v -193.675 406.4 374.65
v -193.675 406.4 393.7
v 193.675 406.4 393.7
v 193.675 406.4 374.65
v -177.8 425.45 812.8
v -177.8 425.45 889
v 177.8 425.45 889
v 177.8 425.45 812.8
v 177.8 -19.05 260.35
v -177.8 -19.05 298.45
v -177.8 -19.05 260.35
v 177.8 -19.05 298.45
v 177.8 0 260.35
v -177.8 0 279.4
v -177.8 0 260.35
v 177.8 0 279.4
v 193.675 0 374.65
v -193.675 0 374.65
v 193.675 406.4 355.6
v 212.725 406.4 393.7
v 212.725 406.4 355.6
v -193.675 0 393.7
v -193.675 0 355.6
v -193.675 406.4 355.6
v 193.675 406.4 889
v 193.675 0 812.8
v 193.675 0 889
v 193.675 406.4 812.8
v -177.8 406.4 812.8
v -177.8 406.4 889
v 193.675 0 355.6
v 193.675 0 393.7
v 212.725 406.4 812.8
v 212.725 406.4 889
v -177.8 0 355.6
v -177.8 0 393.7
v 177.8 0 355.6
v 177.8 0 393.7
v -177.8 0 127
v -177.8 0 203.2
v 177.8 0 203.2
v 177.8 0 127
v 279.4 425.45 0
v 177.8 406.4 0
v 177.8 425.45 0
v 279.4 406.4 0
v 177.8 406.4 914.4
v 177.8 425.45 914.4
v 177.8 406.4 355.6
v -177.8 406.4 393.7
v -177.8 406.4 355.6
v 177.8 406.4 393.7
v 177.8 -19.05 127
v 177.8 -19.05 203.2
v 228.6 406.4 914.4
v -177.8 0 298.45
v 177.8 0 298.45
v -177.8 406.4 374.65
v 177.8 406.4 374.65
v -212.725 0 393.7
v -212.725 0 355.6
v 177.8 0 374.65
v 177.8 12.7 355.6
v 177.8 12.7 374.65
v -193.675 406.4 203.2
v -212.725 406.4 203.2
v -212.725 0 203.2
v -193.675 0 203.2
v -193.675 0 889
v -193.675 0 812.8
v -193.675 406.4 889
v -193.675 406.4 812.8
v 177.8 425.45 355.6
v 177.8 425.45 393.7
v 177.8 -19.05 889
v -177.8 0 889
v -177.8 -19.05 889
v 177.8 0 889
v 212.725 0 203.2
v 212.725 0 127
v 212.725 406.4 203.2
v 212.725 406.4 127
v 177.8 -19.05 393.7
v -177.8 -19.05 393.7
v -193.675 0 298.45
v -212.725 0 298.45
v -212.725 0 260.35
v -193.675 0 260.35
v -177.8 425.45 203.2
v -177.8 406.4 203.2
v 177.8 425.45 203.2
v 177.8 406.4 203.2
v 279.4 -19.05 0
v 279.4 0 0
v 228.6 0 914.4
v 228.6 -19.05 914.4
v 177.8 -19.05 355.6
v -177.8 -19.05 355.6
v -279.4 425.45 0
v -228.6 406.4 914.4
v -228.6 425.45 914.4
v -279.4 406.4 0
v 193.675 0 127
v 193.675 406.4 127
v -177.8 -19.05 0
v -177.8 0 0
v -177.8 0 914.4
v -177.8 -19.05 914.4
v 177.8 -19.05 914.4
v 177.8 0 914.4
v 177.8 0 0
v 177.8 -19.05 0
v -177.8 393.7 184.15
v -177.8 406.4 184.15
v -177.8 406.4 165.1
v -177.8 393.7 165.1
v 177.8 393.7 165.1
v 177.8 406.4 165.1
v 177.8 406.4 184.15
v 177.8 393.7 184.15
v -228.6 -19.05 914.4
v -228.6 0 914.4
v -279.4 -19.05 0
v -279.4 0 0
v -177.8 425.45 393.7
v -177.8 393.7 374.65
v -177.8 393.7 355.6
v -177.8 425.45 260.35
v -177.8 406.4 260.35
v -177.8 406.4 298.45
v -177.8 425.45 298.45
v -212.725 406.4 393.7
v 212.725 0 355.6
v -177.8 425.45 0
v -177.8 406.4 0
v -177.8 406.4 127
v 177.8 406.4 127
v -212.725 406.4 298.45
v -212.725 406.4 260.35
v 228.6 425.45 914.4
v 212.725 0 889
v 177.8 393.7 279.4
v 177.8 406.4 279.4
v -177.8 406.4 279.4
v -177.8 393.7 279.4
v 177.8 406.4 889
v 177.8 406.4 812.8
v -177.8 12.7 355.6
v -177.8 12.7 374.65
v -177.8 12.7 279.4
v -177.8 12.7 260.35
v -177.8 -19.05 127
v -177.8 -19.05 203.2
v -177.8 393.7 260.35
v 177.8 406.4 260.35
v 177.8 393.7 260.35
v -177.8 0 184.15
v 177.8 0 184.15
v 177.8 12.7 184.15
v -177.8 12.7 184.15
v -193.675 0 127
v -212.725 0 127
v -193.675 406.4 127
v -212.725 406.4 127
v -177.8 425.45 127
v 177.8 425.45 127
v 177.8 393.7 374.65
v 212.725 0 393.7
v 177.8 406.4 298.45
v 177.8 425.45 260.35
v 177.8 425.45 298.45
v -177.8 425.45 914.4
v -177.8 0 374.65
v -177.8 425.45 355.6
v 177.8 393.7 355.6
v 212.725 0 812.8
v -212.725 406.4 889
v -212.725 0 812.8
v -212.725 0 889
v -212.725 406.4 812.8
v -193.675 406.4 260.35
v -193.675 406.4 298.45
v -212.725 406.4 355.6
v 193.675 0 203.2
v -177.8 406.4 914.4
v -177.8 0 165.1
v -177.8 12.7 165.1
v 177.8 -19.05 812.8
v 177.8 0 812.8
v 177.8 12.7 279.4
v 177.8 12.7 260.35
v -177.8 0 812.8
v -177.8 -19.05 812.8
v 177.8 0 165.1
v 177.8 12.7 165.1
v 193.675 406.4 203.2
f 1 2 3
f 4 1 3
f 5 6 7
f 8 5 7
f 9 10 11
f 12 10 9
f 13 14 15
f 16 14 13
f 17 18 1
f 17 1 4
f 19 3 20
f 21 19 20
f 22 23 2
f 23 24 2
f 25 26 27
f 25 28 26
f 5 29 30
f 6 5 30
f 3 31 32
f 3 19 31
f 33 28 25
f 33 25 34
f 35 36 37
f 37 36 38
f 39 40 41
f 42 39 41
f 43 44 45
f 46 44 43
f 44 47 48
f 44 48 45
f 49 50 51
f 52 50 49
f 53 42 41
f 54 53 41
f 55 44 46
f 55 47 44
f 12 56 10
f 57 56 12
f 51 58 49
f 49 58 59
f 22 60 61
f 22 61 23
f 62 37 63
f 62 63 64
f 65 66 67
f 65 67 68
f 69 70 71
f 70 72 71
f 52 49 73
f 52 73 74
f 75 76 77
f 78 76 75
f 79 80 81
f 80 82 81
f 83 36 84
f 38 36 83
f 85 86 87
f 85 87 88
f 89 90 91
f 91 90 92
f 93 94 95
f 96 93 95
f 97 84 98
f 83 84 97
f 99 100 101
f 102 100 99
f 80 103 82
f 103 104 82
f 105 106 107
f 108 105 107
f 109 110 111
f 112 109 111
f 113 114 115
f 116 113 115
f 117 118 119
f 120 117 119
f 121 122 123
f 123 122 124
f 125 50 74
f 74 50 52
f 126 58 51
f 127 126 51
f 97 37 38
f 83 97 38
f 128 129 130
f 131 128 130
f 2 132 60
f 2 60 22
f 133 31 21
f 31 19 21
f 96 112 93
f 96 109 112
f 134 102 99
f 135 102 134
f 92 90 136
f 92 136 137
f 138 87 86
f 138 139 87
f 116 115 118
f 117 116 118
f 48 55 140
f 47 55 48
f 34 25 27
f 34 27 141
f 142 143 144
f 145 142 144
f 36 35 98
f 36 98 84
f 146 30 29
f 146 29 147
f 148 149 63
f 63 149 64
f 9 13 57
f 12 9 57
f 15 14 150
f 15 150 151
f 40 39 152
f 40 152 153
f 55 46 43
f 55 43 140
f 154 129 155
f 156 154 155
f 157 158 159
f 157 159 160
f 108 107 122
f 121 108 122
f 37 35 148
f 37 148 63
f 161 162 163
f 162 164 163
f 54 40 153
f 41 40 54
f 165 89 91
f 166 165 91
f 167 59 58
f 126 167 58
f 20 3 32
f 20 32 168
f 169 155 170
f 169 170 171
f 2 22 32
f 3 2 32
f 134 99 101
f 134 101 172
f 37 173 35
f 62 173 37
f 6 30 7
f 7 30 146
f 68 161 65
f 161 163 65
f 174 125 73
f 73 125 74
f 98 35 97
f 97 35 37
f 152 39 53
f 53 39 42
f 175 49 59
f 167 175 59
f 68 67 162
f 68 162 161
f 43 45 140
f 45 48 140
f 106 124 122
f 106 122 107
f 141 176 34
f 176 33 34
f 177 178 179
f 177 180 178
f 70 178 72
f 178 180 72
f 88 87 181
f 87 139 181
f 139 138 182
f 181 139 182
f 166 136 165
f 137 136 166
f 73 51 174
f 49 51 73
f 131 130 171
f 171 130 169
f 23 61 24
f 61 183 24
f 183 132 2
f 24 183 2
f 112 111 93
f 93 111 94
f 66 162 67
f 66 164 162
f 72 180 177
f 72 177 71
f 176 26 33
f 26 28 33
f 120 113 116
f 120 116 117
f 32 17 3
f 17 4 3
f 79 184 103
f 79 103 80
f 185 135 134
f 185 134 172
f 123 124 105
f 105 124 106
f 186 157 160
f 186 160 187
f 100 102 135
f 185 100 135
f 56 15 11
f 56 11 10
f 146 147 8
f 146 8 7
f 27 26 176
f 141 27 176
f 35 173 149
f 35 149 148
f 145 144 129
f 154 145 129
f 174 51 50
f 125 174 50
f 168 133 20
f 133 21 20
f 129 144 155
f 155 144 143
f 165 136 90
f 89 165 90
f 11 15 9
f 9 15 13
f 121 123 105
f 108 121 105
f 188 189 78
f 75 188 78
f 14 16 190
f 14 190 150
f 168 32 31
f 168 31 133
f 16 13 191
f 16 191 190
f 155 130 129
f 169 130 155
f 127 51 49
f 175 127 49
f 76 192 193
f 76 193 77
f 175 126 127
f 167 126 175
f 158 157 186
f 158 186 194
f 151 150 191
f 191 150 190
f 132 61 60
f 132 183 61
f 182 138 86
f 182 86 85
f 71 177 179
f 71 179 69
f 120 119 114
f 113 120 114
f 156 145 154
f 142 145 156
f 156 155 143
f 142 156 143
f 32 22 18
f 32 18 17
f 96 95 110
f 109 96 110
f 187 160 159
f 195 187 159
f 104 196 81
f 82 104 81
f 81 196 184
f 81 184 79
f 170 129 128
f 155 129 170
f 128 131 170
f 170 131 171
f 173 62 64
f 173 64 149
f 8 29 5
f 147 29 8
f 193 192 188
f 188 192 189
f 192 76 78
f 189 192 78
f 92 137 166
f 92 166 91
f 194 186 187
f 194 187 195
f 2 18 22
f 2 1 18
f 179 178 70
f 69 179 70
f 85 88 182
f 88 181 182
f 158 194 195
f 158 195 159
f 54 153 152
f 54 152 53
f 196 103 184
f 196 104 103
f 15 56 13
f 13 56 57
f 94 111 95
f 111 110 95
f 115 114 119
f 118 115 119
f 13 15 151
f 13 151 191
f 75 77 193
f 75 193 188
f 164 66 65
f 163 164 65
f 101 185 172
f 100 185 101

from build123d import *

# Parameters (mm, degrees)
F1_DEPTH       = 19.05
F0_W           = 355.6
F0_H           = 76.2
F2_DEPTH       = 19.05
F0_H_2         = 38.1
F4_DEPTH       = 12.7
F7_W           = 19.05
F7_H           = 76.2
F8_DEPTH       = 203.2
F8_DEPTH_BACK  = 203.2
F7_H_2         = 38.1
F9_W           = 387.35
F9_H           = 19.05
F10_DEPTH      = 203.2
F10_DEPTH_BACK = 203.2


with BuildPart() as f1:
    # F0 (on Front) → F1 (new body)
    with BuildSketch(Plane.XZ):
        Polygon((-228.6, 914.4), (-279.4, 0), (-177.8, 0), (-177.8, 127), (-177.8, 203.2), (-177.8, 260.35), (-177.8, 298.45), (-177.8, 355.6), (-177.8, 393.7), (-177.8, 812.8), (-177.8, 889), (-177.8, 914.4), align=None)
    extrude(amount=F1_DEPTH)


with BuildPart() as f1b:
    # F0 (on Front) → F1, piece 2 (new body)
    with BuildSketch(Plane.XZ):
        Polygon((177.8, 203.2), (177.8, 127), (177.8, 0), (279.4, 0), (228.6, 914.4), (177.8, 914.4), (177.8, 889), (177.8, 812.8), (177.8, 393.7), (177.8, 355.6), (177.8, 298.45), (177.8, 260.35), align=None)
    extrude(amount=F1_DEPTH)


with BuildPart() as f2:
    # F0 (on Front) → F2 (new body)
    with BuildSketch(Plane.XZ):
        with Locations((0, 850.9)):
            Rectangle(F0_W, F0_H)
    extrude(amount=F2_DEPTH)


with BuildPart() as f2b:
    # F0 (on Front) → F2, piece 2 (new body)
    with BuildSketch(Plane.XZ):
        with Locations((0, 374.65)):
            Rectangle(F0_W, F0_H_2)
    extrude(amount=F2_DEPTH)


with BuildPart() as f2c:
    # F0 (on Front) → F2, piece 3 (new body)
    with BuildSketch(Plane.XZ):
        with Locations((0, 279.4)):
            Rectangle(F0_W, F0_H_2)
    extrude(amount=F2_DEPTH)


with BuildPart() as f2d:
    # F0 (on Front) → F2, piece 4 (new body)
    with BuildSketch(Plane.XZ):
        with Locations((0, 165.1)):
            Rectangle(F0_W, F0_H)
    extrude(amount=F2_DEPTH)


with BuildPart() as f4:
    # F3 (on Front) → F4 (new body)
    with BuildSketch(Plane.XZ):
        Polygon((177.8, 355.6), (177.8, 374.65), (0, 374.65), (-177.8, 374.65), (-177.8, 355.6), (0, 355.6), align=None)
    extrude(amount=-F4_DEPTH)


with BuildPart() as f4b:
    # F3 (on Front) → F4, piece 2 (new body)
    with BuildSketch(Plane.XZ):
        Polygon((177.8, 260.35), (177.8, 279.4), (0, 279.4), (-177.8, 279.4), (-177.8, 260.35), (0, 260.35), align=None)
    extrude(amount=-F4_DEPTH)


with BuildPart() as f4c:
    # F3 (on Front) → F4, piece 3 (new body)
    with BuildSketch(Plane.XZ):
        Polygon((177.8, 165.1), (177.8, 184.15), (0, 184.15), (-177.8, 184.15), (-177.8, 165.1), (0, 165.1), align=None)
    extrude(amount=-F4_DEPTH)


with BuildPart() as f6_1:
    # F6: instance of F2
    add(f2.part.mirror(Plane.XZ.offset(-203.2)))


with BuildPart() as f6_2:
    # F6: instance of F2c
    add(f2c.part.mirror(Plane.XZ.offset(-203.2)))


with BuildPart() as f6_3:
    # F6: instance of F2d
    add(f2d.part.mirror(Plane.XZ.offset(-203.2)))


with BuildPart() as f6_4:
    # F6: instance of F4
    add(f4.part.mirror(Plane.XZ.offset(-203.2)))


with BuildPart() as f6_5:
    # F6: instance of F2b
    add(f2b.part.mirror(Plane.XZ.offset(-203.2)))


with BuildPart() as f6_6:
    # F6: instance of F1b
    add(f1b.part.mirror(Plane.XZ.offset(-203.2)))


with BuildPart() as f6_7:
    # F6: instance of F1
    add(f1.part.mirror(Plane.XZ.offset(-203.2)))


with BuildPart() as f6_8:
    # F6: instance of F4c
    add(f4c.part.mirror(Plane.XZ.offset(-203.2)))


with BuildPart() as f6_9:
    # F6: instance of F4b
    add(f4b.part.mirror(Plane.XZ.offset(-203.2)))


with BuildPart() as f8:
    # F7 (on offset) → F8 (new body, two sides)
    with BuildSketch(Plane.XZ.offset(-203.2)) as f8_sk:
        with Locations((203.2, 850.9)):
            Rectangle(F7_W, F7_H)
    extrude(amount=-F8_DEPTH)
    extrude(f8_sk.sketch, amount=F8_DEPTH_BACK)


with BuildPart() as f8b:
    # F7 (on offset) → F8, piece 2 (new body, two sides)
    with BuildSketch(Plane.XZ.offset(-203.2)) as f8_2_sk:
        with Locations((-203.2, 850.9)):
            Rectangle(F7_W, F7_H)
    extrude(amount=-F8_DEPTH)
    extrude(f8_2_sk.sketch, amount=F8_DEPTH_BACK)


with BuildPart() as f8c:
    # F7 (on offset) → F8, piece 3 (new body, two sides)
    with BuildSketch(Plane.XZ.offset(-203.2)) as f8_3_sk:
        with Locations((-203.2, 374.65)):
            Rectangle(F7_W, F7_H_2)
    extrude(amount=-F8_DEPTH)
    extrude(f8_3_sk.sketch, amount=F8_DEPTH_BACK)


with BuildPart() as f8d:
    # F7 (on offset) → F8, piece 4 (new body, two sides)
    with BuildSketch(Plane.XZ.offset(-203.2)) as f8_4_sk:
        with Locations((-203.2, 279.4)):
            Rectangle(F7_W, F7_H_2)
    extrude(amount=-F8_DEPTH)
    extrude(f8_4_sk.sketch, amount=F8_DEPTH_BACK)


with BuildPart() as f8e:
    # F7 (on offset) → F8, piece 5 (new body, two sides)
    with BuildSketch(Plane.XZ.offset(-203.2)) as f8_5_sk:
        with Locations((-203.2, 165.1)):
            Rectangle(F7_W, F7_H)
    extrude(amount=-F8_DEPTH)
    extrude(f8_5_sk.sketch, amount=F8_DEPTH_BACK)


with BuildPart() as f8f:
    # F7 (on offset) → F8, piece 6 (new body, two sides)
    with BuildSketch(Plane.XZ.offset(-203.2)) as f8_6_sk:
        with Locations((203.2, 165.1)):
            Rectangle(F7_W, F7_H)
    extrude(amount=-F8_DEPTH)
    extrude(f8_6_sk.sketch, amount=F8_DEPTH_BACK)


with BuildPart() as f8g:
    # F7 (on offset) → F8, piece 7 (new body, two sides)
    with BuildSketch(Plane.XZ.offset(-203.2)) as f8_7_sk:
        with Locations((203.2, 374.65)):
            Rectangle(F7_W, F7_H_2)
    extrude(amount=-F8_DEPTH)
    extrude(f8_7_sk.sketch, amount=F8_DEPTH_BACK)


with BuildPart() as f10:
    # F9 (on offset) → F10 (new body, two sides)
    with BuildSketch(Plane.XZ.offset(-203.2)) as f10_sk:
        with Locations((0, 384.175)):
            Rectangle(F9_W, F9_H)
    extrude(amount=-F10_DEPTH)
    extrude(f10_sk.sketch, amount=F10_DEPTH_BACK)


solid = Compound([f1.part, f1b.part, f2.part, f2b.part, f2c.part, f2d.part, f4.part, f4b.part, f4c.part, f6_1.part, f6_2.part, f6_3.part, f6_4.part, f6_5.part, f6_6.part, f6_7.part, f6_8.part, f6_9.part, f8.part, f8b.part, f8c.part, f8d.part, f8e.part, f8f.part, f8g.part, f10.part])
